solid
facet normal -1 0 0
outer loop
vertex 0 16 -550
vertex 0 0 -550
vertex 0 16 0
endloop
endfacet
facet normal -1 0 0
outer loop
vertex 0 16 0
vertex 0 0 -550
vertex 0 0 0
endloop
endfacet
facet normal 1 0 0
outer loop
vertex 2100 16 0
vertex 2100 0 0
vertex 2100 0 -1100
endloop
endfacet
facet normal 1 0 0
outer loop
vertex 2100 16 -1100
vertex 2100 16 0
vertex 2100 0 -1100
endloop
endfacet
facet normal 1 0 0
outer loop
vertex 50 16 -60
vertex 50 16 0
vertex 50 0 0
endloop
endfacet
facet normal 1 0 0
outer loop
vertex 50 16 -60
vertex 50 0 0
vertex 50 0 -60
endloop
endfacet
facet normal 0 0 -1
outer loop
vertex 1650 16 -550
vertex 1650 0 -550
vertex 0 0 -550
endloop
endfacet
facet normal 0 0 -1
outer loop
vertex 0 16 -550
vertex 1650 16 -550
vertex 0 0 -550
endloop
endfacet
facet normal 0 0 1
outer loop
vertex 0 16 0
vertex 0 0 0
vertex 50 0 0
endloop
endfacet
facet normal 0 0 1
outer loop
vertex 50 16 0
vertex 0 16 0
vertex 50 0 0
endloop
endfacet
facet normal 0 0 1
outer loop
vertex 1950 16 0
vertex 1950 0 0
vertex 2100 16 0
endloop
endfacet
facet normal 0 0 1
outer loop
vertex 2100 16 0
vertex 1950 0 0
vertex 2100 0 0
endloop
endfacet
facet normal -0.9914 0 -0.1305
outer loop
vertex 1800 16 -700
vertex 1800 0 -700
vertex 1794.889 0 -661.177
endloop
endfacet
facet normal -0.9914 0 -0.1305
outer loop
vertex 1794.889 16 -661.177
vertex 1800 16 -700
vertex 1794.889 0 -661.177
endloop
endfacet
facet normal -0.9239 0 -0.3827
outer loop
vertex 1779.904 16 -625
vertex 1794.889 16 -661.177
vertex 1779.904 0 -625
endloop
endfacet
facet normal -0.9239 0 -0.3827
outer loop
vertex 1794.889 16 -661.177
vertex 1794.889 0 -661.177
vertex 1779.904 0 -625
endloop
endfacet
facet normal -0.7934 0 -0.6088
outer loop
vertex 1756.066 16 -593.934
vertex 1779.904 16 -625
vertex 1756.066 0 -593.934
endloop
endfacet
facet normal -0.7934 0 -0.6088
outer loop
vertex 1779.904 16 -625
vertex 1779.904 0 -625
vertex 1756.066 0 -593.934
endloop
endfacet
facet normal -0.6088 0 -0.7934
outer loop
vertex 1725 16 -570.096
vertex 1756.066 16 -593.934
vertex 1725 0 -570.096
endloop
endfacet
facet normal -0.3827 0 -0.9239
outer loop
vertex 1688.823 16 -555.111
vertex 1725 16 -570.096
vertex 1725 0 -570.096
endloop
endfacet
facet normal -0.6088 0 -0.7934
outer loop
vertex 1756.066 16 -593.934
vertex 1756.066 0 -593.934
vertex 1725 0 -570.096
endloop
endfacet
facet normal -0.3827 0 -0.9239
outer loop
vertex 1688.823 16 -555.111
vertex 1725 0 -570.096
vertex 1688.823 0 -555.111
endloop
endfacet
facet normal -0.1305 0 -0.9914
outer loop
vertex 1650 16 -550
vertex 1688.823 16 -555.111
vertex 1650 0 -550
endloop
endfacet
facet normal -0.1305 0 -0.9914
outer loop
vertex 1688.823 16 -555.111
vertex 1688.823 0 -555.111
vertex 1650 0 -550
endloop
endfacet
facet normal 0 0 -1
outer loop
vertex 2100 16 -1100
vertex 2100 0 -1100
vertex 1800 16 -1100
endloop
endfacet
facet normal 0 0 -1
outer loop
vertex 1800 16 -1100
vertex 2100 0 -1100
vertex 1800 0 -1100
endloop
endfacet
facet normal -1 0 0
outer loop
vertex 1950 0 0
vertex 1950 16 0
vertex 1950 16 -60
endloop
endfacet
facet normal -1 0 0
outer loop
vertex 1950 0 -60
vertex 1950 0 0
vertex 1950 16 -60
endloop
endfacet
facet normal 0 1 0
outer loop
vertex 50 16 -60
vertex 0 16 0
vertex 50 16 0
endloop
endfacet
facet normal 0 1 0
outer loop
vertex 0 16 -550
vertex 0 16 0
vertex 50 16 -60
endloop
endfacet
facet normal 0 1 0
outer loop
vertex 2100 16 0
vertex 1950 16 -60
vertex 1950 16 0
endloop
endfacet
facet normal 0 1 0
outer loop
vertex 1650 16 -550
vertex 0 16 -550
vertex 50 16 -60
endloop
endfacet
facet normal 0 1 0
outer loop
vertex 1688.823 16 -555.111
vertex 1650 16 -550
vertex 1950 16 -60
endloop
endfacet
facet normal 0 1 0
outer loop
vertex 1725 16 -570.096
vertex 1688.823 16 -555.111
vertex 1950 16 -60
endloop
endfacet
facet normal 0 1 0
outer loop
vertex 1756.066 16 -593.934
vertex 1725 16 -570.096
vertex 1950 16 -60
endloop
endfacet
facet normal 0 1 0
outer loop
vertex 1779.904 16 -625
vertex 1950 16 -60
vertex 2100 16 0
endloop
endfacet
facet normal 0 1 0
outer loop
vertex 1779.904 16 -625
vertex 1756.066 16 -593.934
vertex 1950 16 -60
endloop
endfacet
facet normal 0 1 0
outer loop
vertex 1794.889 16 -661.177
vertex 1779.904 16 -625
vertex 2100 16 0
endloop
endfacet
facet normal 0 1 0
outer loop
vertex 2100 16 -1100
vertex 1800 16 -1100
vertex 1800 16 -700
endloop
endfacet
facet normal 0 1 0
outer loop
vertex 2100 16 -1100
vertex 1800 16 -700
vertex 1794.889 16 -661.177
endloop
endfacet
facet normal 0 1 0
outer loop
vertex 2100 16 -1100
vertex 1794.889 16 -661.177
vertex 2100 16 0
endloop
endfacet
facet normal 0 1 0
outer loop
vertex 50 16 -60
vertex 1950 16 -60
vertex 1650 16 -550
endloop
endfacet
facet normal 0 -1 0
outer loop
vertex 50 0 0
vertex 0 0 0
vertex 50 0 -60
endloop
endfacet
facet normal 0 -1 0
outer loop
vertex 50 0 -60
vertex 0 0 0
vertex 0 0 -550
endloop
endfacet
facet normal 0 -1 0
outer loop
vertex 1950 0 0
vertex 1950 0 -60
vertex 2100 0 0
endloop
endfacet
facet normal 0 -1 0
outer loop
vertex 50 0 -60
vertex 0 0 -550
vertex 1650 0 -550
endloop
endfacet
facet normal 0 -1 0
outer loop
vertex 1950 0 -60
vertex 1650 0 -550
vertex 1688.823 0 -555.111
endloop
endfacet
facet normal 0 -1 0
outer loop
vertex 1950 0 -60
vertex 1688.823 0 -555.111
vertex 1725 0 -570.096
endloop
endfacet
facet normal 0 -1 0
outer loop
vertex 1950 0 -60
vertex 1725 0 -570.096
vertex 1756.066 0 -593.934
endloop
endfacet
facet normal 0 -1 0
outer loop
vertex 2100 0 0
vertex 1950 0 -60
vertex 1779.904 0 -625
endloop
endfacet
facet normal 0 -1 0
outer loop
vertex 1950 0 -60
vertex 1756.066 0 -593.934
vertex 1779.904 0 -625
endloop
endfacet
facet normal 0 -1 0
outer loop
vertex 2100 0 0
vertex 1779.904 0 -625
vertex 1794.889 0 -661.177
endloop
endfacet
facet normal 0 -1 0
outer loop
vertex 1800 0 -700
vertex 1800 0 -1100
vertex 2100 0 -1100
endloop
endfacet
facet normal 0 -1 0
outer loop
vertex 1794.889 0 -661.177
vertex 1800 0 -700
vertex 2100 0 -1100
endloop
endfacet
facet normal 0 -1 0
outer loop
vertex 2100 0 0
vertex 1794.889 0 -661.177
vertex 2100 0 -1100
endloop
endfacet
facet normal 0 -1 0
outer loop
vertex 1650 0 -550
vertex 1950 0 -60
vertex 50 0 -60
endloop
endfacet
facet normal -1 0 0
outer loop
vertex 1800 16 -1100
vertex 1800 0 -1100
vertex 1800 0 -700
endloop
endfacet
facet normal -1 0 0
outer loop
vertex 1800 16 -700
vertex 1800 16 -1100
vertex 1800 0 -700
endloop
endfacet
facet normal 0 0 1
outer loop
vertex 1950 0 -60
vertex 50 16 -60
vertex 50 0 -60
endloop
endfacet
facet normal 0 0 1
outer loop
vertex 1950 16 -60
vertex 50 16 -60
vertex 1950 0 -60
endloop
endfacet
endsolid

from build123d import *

# Parameters (mm, degrees)
AUFSATZ_LINEAR_AUSTRAGEN1_DEPTH = 16
SKIZZE2_W                       = 1900
SKIZZE2_H                       = 60
SCHNITT_LINEAR_AUSTRAGEN1_DEPTH = 2371.707911152


with BuildPart() as part:
    # Skizze1 → Aufsatz-Linear austragen1 (new body)
    with BuildSketch(Plane(origin=(0, 0, 0), x_dir=(1, 0, 0), z_dir=(0, 1, 0))):
        with BuildLine():
            Line((2100, 0), (2100, 1100))
            Line((2100, 1100), (1800, 1100))
            Line((1800, 1100), (1800, 700))
            ThreePointArc((1800, 700), (1756.066017178, 593.933982822), (1650, 550))
            Line((1650, 550), (0, 550))
            Line((0, 550), (0, 0))
            Line((0, 0), (2100, 0))
        make_face()
    extrude(amount=AUFSATZ_LINEAR_AUSTRAGEN1_DEPTH)

    # Skizze2 → Schnitt-Linear austragen1 (cut, through all)
    with BuildSketch(Plane(origin=(0, 16, 0), x_dir=(1, 0, 0), z_dir=(0, 1, 0))):
        with Locations((1000, 30)):
            Rectangle(SKIZZE2_W, SKIZZE2_H)
    extrude(amount=-SCHNITT_LINEAR_AUSTRAGEN1_DEPTH, mode=Mode.SUBTRACT)


solid = part.part
